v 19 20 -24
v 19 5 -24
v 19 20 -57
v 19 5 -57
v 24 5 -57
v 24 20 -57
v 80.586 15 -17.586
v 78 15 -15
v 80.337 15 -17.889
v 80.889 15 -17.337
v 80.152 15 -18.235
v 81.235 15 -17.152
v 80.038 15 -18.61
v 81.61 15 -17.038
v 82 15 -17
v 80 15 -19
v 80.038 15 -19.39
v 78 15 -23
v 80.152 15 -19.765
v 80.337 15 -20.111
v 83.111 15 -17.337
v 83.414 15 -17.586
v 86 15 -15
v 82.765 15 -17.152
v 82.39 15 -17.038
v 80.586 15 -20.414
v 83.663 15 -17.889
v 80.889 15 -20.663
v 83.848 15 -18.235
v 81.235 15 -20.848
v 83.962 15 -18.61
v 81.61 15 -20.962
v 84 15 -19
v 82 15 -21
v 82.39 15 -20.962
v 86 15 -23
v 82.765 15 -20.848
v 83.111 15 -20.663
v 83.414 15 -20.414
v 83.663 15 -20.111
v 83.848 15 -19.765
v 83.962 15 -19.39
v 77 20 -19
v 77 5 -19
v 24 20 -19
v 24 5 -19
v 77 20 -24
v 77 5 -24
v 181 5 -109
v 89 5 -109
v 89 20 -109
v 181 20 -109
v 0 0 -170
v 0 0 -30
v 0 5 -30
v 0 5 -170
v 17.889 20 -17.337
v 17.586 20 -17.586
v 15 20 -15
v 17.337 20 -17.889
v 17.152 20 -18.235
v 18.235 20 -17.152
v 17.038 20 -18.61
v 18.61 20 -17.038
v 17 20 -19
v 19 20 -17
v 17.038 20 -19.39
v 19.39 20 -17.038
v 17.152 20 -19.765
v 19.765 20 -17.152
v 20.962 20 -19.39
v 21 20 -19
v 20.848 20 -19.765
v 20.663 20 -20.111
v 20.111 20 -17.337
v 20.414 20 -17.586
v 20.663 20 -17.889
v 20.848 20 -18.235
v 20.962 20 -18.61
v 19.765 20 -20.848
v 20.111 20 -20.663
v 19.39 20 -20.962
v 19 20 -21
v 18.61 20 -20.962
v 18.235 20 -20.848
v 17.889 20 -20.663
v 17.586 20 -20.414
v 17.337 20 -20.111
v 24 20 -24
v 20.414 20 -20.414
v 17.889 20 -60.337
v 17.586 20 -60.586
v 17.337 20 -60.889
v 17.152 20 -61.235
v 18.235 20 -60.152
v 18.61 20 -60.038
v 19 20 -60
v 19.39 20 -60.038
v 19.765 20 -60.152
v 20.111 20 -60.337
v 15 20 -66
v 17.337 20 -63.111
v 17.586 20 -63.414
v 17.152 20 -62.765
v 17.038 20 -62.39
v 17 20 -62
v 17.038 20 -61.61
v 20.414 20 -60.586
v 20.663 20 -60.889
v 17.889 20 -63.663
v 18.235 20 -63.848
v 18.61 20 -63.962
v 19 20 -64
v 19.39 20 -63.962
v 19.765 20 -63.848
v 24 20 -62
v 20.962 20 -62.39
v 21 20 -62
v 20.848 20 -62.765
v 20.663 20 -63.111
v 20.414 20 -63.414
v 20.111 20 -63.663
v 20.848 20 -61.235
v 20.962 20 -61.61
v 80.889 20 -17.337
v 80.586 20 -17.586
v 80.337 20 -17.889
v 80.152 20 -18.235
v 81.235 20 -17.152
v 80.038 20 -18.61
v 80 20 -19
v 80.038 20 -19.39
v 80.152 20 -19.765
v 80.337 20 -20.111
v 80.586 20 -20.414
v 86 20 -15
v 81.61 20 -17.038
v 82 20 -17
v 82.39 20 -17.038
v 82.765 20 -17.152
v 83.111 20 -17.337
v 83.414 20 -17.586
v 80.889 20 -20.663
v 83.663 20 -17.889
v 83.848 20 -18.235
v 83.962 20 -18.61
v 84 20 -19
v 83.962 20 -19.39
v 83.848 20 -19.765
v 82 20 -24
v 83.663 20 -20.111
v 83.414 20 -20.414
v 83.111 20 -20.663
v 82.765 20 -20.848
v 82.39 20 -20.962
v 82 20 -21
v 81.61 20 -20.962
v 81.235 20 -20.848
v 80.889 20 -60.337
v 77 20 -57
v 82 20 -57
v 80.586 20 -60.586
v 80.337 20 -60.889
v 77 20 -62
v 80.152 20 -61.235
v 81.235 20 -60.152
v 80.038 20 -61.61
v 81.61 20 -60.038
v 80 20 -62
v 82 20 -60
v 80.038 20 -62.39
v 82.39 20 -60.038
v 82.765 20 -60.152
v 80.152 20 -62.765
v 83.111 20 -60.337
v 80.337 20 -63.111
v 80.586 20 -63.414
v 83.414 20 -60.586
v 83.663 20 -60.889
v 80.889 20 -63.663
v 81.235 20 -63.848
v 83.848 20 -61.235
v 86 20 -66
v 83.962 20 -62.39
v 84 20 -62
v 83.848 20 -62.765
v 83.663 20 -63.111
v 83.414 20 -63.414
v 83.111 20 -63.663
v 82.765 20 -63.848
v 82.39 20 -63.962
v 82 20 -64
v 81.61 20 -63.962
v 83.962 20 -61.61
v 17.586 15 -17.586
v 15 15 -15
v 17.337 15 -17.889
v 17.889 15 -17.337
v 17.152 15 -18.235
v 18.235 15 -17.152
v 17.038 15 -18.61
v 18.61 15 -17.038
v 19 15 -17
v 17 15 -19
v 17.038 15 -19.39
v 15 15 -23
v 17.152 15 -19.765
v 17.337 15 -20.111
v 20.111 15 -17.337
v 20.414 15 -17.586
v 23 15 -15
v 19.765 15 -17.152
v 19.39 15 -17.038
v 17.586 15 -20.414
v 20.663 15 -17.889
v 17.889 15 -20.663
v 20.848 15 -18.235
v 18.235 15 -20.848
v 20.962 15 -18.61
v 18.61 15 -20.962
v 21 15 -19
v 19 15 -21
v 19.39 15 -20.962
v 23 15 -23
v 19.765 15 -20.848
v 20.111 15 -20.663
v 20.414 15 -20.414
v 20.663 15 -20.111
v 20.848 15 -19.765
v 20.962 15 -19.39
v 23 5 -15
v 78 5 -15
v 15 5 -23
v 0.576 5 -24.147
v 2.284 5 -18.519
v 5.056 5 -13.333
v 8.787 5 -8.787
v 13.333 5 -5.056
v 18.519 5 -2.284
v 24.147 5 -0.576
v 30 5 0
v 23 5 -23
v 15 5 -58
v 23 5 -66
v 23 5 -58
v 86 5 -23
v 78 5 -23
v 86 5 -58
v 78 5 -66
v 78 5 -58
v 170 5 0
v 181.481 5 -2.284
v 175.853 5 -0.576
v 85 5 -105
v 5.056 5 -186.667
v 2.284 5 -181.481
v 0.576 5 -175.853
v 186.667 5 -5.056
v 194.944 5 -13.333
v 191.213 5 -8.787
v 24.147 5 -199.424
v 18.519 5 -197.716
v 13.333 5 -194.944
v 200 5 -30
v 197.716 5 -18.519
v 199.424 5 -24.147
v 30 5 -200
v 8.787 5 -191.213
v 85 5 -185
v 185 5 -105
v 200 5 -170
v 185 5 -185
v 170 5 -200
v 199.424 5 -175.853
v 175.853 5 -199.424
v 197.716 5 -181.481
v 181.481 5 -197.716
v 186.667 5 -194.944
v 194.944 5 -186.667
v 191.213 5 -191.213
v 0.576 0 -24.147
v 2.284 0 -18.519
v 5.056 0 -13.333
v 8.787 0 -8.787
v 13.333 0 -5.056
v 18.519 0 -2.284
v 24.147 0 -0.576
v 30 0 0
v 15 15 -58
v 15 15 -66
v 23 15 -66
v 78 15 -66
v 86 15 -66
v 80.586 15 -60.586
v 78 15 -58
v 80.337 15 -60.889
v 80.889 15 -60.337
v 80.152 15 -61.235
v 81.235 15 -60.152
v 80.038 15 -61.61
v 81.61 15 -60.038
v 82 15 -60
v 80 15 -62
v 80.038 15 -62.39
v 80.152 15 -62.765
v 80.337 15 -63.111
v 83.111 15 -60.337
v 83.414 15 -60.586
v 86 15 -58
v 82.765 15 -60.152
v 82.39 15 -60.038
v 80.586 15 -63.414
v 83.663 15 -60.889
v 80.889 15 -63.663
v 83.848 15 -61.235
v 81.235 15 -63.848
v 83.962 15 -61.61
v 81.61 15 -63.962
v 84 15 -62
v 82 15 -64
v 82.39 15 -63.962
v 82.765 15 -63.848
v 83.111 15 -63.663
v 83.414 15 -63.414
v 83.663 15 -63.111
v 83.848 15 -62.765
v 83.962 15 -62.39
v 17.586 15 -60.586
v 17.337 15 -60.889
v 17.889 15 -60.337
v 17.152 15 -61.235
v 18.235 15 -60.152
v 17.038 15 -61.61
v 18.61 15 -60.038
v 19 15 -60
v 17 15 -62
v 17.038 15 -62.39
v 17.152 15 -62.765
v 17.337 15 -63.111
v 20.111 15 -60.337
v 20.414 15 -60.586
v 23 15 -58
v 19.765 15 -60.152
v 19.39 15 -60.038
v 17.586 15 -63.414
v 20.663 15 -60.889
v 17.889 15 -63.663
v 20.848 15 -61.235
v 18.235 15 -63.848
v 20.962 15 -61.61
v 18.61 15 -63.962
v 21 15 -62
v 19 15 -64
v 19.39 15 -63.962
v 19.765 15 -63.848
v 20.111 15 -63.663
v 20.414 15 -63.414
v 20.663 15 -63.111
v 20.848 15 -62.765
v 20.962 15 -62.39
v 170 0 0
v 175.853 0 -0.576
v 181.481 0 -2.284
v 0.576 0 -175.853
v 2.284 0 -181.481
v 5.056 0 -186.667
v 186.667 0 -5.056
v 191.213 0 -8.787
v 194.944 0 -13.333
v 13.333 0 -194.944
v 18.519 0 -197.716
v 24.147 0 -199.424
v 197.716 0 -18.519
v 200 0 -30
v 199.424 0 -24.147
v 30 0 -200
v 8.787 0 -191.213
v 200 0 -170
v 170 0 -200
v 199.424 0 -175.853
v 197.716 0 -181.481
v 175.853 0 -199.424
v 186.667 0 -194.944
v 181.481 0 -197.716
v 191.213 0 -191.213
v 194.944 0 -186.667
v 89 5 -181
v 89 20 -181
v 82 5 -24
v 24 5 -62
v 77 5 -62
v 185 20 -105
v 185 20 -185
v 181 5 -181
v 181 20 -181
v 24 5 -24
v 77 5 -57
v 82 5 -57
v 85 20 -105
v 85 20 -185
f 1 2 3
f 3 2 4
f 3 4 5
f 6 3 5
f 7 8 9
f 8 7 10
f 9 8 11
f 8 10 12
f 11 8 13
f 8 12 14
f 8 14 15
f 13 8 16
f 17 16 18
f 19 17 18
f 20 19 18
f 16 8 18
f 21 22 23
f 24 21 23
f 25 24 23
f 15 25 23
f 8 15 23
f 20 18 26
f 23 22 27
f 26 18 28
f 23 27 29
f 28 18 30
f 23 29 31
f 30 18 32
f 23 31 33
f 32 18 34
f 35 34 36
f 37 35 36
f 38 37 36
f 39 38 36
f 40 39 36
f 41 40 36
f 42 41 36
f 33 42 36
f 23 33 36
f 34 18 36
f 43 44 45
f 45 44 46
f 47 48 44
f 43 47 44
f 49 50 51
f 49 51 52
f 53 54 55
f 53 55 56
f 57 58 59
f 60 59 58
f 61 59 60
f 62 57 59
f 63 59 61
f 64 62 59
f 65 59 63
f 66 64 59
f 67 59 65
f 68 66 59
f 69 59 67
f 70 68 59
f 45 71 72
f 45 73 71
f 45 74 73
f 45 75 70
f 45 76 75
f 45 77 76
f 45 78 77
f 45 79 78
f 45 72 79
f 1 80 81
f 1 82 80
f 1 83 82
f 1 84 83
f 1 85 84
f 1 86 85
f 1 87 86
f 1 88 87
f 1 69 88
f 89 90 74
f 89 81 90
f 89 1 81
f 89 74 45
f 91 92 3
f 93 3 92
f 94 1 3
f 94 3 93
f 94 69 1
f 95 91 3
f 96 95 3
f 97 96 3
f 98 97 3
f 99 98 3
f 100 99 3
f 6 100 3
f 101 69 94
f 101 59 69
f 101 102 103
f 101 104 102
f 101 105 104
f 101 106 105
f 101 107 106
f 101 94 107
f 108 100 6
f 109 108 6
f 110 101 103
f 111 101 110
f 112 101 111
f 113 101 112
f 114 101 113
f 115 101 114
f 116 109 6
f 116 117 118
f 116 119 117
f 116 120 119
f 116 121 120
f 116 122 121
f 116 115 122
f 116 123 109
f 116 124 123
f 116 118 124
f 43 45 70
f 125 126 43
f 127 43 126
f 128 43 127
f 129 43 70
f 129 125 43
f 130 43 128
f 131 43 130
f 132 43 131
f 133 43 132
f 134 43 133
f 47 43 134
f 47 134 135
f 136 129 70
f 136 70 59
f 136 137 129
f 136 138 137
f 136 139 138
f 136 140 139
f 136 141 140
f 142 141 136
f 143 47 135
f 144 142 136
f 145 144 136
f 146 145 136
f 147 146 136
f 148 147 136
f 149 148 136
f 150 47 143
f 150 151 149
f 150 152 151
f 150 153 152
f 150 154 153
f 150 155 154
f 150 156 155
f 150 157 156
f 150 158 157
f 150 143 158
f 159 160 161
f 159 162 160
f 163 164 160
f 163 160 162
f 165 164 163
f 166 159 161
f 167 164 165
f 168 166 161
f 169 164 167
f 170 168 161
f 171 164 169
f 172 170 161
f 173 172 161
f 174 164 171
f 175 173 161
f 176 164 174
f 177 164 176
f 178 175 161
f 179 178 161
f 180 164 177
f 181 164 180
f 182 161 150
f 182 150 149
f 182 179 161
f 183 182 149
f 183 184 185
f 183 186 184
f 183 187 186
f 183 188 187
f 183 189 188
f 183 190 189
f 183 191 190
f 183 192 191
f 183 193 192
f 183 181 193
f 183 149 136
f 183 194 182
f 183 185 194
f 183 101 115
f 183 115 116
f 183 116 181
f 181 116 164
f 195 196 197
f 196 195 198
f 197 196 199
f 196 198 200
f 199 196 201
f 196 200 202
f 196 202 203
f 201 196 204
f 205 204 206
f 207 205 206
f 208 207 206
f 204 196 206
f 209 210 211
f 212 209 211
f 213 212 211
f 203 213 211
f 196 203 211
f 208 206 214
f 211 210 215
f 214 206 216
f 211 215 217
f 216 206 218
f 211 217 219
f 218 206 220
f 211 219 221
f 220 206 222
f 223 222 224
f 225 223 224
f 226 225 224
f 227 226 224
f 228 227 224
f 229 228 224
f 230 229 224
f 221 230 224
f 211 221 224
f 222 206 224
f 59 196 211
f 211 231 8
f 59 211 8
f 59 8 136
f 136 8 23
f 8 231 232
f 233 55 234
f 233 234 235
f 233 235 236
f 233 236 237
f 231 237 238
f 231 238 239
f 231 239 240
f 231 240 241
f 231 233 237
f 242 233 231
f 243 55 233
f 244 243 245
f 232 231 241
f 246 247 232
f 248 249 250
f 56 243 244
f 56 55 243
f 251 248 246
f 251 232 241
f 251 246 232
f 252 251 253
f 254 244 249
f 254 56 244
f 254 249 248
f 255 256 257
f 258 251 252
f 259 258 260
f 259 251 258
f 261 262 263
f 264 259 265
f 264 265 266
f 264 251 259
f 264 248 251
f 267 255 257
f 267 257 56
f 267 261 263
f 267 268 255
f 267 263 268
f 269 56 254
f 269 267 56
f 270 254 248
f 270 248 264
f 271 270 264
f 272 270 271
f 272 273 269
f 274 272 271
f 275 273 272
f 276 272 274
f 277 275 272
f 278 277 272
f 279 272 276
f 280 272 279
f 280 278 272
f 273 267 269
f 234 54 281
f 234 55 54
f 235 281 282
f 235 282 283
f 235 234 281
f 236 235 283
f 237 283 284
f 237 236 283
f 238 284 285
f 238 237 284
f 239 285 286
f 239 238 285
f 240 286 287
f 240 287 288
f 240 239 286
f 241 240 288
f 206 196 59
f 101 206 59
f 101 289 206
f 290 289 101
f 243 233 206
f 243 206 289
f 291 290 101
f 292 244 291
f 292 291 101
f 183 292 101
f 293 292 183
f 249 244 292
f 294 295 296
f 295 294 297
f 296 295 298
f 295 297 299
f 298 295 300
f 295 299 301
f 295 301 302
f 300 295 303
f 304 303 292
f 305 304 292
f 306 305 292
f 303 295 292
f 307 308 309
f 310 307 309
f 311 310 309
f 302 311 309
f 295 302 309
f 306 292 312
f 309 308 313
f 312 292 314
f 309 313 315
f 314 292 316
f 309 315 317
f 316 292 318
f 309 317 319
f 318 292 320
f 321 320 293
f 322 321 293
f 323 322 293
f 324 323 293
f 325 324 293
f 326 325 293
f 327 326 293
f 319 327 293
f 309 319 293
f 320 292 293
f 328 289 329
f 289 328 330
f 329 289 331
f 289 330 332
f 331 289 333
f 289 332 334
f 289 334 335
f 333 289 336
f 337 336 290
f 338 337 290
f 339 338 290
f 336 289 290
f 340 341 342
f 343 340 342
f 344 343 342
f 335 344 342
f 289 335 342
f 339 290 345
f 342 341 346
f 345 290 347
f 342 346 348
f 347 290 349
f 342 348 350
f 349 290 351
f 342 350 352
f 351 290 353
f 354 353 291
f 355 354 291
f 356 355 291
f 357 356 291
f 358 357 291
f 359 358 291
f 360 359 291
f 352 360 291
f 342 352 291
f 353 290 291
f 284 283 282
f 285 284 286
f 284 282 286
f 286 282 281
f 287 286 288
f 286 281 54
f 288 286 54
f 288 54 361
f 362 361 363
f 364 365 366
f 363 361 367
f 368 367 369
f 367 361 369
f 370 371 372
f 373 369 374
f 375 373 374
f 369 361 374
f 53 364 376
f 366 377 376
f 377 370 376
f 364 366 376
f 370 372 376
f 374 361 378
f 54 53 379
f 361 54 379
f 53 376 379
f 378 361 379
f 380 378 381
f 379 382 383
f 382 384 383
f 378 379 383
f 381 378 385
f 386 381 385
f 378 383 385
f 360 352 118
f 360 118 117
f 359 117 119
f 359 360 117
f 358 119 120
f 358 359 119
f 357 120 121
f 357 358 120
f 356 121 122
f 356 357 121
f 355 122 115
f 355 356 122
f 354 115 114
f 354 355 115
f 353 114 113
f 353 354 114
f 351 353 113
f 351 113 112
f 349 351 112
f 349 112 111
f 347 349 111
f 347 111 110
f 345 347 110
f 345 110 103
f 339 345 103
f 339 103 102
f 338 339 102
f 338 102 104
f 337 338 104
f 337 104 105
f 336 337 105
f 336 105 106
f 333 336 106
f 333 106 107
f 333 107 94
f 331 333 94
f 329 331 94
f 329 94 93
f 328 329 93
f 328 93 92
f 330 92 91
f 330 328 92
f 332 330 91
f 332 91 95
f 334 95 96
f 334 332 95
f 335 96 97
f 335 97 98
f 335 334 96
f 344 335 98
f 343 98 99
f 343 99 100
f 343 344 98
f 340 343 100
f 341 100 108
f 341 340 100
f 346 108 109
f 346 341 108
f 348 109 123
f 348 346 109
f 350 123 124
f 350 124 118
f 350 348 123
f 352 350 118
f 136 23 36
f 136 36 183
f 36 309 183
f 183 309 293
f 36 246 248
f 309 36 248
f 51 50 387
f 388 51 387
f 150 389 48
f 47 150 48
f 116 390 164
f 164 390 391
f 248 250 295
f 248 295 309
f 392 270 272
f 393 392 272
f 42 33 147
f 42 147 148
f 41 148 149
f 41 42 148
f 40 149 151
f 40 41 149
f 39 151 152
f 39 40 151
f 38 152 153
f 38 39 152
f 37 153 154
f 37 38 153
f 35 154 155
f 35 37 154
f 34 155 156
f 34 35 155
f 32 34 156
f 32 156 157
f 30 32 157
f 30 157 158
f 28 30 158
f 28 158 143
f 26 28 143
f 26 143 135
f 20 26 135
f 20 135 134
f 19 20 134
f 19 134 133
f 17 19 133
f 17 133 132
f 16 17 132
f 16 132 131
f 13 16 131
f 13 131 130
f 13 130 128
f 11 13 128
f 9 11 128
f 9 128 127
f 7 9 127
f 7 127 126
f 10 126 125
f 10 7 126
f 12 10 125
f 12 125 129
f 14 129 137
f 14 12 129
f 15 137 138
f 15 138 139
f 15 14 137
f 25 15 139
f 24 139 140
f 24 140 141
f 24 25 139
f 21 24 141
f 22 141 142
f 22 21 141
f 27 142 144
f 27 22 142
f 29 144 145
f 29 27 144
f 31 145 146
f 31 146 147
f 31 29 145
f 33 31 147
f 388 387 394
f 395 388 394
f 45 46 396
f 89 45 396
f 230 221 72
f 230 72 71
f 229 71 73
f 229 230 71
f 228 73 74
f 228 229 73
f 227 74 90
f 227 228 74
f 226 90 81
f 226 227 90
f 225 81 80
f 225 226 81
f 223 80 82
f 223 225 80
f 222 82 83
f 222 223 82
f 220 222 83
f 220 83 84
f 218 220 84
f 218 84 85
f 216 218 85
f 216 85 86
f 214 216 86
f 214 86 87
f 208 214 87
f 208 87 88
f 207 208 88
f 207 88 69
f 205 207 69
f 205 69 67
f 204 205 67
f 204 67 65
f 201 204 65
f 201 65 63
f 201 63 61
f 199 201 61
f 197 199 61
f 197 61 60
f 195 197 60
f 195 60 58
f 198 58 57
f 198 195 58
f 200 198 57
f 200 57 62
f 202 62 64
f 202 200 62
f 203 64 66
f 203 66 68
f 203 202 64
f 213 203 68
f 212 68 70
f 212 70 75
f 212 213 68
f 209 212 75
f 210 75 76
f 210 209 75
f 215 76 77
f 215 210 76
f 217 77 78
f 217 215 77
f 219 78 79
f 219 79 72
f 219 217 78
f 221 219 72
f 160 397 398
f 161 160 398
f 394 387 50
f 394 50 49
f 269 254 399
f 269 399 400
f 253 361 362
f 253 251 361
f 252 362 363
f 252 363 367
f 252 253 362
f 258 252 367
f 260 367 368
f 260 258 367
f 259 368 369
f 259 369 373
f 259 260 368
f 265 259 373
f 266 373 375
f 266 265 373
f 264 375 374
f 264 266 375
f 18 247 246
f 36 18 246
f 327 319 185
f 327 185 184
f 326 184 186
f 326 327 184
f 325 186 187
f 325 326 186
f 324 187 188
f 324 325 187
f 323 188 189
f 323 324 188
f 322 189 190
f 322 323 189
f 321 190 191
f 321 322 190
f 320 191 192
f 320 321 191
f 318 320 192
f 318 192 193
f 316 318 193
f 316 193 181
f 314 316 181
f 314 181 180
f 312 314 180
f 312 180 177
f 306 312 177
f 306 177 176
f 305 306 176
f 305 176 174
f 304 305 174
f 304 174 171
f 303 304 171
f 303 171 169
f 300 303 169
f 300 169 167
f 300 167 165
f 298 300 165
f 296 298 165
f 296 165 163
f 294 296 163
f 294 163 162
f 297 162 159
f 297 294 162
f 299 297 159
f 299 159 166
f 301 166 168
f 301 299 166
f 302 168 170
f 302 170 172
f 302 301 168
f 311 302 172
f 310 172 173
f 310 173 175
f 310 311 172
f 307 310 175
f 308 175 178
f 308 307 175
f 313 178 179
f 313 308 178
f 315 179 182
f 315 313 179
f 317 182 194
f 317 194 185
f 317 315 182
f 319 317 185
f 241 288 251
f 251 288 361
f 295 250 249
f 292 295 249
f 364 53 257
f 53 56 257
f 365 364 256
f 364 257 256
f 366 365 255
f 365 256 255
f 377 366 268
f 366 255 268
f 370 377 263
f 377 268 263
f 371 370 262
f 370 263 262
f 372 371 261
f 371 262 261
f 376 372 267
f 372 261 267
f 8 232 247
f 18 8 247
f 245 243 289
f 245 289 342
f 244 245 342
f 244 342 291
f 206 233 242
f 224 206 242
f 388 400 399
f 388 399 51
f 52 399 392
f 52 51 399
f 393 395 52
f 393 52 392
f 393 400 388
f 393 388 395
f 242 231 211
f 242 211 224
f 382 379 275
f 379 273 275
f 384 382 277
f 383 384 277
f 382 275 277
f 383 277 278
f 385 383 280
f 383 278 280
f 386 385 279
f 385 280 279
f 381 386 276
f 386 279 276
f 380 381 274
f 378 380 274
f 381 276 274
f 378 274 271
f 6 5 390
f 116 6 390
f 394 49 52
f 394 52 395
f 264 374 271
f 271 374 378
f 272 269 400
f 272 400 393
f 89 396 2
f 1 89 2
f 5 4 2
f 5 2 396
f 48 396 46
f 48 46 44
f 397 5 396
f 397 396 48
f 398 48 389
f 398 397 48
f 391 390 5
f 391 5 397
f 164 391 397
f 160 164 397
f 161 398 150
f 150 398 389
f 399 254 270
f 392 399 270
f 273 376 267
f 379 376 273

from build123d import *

# Parameters (mm, degrees)
SKETCH1_W            = 200
SKETCH1_H            = 200
BOSS_EXTRUDE1_DEPTH  = 5
SKETCH4_W            = 100
SKETCH4_H            = 80
SKETCH4_W_2          = 92
SKETCH4_H_2          = 72
BOSS_EXTRUDE2_DEPTH  = 15
SKETCH8_W            = 71
SKETCH8_H            = 51
SKETCH8_R            = 2
BOSS_EXTRUDE4_DEPTH  = 15
SKETCH9_W            = 8
SKETCH9_H            = 8
CUT_EXTRUDE11_DEPTH  = 10
LPATTERN1_COUNT      = 2
LPATTERN1_PITCH      = 63
LPATTERN1_COUNT_DIR2 = 2
LPATTERN1_PITCH_DIR2 = 43
FILLET1_R            = 30


with BuildPart() as part:
    # Sketch1 → Boss-Extrude1 (new body)
    with BuildSketch(Plane(origin=(0, 0, 0), x_dir=(1, 0, 0), z_dir=(0, 1, 0))):
        with Locations((100, 100)):
            Rectangle(SKETCH1_W, SKETCH1_H)
    extrude(amount=BOSS_EXTRUDE1_DEPTH)

    # Sketch4 → Boss-Extrude2 (add)
    with BuildSketch(Plane(origin=(0, 5, 0), x_dir=(1, 0, 0), z_dir=(0, 1, 0))):
        with Locations((135, 145)):
            Rectangle(SKETCH4_W, SKETCH4_H)
        with Locations((135, 145)):
            Rectangle(SKETCH4_W_2, SKETCH4_H_2, mode=Mode.SUBTRACT)
    extrude(amount=BOSS_EXTRUDE2_DEPTH)

    # Sketch8 → Boss-Extrude4 (add)
    with BuildSketch(Plane(origin=(0, 5, 0), x_dir=(1, 0, 0), z_dir=(0, 1, 0))):
        with Locations((50.5, 40.5)):
            Rectangle(SKETCH8_W, SKETCH8_H)
        with Locations((19, 62)):
            Circle(SKETCH8_R, mode=Mode.SUBTRACT)
        with Locations((82, 62)):
            Circle(SKETCH8_R, mode=Mode.SUBTRACT)
        with Locations((82, 19)):
            Circle(SKETCH8_R, mode=Mode.SUBTRACT)
        with Locations((19, 19)):
            Circle(SKETCH8_R, mode=Mode.SUBTRACT)
        Polygon((19, 57), (24, 57), (24, 62), (77, 62), (77, 57), (82, 57), (82, 24), (77, 24), (77, 19), (24, 19), (24, 24), (19, 24), align=None, mode=Mode.SUBTRACT)
    extrude(amount=BOSS_EXTRUDE4_DEPTH)

    # Sketch9 → Cut-Extrude11 (cut)
    with BuildSketch(Plane(origin=(0, 5, 0), x_dir=(1, 0, 0), z_dir=(0, 1, 0))):
        with Locations((19, 62)):
            Rectangle(SKETCH9_W, SKETCH9_H)
    cut_extrude11 = extrude(amount=CUT_EXTRUDE11_DEPTH, mode=Mode.SUBTRACT)

    # LPattern1: Cut-Extrude11 2 × 2
    with Locations(*[(i * LPATTERN1_PITCH, 0, j * LPATTERN1_PITCH_DIR2) for i in range(LPATTERN1_COUNT) for j in range(LPATTERN1_COUNT_DIR2) if (i, j) != (0, 0)]):
        add(cut_extrude11, mode=Mode.SUBTRACT)

    # Fillet1
    fillet1_edges = [part.edges().sort_by_distance(p)[0] for p in [
        (0, 2.5, -200),
        (200, 2.5, -200),
        (200, 2.5, 0),
        (0, 2.5, 0),
    ]]
    fillet(fillet1_edges, radius=FILLET1_R)


solid = part.part
